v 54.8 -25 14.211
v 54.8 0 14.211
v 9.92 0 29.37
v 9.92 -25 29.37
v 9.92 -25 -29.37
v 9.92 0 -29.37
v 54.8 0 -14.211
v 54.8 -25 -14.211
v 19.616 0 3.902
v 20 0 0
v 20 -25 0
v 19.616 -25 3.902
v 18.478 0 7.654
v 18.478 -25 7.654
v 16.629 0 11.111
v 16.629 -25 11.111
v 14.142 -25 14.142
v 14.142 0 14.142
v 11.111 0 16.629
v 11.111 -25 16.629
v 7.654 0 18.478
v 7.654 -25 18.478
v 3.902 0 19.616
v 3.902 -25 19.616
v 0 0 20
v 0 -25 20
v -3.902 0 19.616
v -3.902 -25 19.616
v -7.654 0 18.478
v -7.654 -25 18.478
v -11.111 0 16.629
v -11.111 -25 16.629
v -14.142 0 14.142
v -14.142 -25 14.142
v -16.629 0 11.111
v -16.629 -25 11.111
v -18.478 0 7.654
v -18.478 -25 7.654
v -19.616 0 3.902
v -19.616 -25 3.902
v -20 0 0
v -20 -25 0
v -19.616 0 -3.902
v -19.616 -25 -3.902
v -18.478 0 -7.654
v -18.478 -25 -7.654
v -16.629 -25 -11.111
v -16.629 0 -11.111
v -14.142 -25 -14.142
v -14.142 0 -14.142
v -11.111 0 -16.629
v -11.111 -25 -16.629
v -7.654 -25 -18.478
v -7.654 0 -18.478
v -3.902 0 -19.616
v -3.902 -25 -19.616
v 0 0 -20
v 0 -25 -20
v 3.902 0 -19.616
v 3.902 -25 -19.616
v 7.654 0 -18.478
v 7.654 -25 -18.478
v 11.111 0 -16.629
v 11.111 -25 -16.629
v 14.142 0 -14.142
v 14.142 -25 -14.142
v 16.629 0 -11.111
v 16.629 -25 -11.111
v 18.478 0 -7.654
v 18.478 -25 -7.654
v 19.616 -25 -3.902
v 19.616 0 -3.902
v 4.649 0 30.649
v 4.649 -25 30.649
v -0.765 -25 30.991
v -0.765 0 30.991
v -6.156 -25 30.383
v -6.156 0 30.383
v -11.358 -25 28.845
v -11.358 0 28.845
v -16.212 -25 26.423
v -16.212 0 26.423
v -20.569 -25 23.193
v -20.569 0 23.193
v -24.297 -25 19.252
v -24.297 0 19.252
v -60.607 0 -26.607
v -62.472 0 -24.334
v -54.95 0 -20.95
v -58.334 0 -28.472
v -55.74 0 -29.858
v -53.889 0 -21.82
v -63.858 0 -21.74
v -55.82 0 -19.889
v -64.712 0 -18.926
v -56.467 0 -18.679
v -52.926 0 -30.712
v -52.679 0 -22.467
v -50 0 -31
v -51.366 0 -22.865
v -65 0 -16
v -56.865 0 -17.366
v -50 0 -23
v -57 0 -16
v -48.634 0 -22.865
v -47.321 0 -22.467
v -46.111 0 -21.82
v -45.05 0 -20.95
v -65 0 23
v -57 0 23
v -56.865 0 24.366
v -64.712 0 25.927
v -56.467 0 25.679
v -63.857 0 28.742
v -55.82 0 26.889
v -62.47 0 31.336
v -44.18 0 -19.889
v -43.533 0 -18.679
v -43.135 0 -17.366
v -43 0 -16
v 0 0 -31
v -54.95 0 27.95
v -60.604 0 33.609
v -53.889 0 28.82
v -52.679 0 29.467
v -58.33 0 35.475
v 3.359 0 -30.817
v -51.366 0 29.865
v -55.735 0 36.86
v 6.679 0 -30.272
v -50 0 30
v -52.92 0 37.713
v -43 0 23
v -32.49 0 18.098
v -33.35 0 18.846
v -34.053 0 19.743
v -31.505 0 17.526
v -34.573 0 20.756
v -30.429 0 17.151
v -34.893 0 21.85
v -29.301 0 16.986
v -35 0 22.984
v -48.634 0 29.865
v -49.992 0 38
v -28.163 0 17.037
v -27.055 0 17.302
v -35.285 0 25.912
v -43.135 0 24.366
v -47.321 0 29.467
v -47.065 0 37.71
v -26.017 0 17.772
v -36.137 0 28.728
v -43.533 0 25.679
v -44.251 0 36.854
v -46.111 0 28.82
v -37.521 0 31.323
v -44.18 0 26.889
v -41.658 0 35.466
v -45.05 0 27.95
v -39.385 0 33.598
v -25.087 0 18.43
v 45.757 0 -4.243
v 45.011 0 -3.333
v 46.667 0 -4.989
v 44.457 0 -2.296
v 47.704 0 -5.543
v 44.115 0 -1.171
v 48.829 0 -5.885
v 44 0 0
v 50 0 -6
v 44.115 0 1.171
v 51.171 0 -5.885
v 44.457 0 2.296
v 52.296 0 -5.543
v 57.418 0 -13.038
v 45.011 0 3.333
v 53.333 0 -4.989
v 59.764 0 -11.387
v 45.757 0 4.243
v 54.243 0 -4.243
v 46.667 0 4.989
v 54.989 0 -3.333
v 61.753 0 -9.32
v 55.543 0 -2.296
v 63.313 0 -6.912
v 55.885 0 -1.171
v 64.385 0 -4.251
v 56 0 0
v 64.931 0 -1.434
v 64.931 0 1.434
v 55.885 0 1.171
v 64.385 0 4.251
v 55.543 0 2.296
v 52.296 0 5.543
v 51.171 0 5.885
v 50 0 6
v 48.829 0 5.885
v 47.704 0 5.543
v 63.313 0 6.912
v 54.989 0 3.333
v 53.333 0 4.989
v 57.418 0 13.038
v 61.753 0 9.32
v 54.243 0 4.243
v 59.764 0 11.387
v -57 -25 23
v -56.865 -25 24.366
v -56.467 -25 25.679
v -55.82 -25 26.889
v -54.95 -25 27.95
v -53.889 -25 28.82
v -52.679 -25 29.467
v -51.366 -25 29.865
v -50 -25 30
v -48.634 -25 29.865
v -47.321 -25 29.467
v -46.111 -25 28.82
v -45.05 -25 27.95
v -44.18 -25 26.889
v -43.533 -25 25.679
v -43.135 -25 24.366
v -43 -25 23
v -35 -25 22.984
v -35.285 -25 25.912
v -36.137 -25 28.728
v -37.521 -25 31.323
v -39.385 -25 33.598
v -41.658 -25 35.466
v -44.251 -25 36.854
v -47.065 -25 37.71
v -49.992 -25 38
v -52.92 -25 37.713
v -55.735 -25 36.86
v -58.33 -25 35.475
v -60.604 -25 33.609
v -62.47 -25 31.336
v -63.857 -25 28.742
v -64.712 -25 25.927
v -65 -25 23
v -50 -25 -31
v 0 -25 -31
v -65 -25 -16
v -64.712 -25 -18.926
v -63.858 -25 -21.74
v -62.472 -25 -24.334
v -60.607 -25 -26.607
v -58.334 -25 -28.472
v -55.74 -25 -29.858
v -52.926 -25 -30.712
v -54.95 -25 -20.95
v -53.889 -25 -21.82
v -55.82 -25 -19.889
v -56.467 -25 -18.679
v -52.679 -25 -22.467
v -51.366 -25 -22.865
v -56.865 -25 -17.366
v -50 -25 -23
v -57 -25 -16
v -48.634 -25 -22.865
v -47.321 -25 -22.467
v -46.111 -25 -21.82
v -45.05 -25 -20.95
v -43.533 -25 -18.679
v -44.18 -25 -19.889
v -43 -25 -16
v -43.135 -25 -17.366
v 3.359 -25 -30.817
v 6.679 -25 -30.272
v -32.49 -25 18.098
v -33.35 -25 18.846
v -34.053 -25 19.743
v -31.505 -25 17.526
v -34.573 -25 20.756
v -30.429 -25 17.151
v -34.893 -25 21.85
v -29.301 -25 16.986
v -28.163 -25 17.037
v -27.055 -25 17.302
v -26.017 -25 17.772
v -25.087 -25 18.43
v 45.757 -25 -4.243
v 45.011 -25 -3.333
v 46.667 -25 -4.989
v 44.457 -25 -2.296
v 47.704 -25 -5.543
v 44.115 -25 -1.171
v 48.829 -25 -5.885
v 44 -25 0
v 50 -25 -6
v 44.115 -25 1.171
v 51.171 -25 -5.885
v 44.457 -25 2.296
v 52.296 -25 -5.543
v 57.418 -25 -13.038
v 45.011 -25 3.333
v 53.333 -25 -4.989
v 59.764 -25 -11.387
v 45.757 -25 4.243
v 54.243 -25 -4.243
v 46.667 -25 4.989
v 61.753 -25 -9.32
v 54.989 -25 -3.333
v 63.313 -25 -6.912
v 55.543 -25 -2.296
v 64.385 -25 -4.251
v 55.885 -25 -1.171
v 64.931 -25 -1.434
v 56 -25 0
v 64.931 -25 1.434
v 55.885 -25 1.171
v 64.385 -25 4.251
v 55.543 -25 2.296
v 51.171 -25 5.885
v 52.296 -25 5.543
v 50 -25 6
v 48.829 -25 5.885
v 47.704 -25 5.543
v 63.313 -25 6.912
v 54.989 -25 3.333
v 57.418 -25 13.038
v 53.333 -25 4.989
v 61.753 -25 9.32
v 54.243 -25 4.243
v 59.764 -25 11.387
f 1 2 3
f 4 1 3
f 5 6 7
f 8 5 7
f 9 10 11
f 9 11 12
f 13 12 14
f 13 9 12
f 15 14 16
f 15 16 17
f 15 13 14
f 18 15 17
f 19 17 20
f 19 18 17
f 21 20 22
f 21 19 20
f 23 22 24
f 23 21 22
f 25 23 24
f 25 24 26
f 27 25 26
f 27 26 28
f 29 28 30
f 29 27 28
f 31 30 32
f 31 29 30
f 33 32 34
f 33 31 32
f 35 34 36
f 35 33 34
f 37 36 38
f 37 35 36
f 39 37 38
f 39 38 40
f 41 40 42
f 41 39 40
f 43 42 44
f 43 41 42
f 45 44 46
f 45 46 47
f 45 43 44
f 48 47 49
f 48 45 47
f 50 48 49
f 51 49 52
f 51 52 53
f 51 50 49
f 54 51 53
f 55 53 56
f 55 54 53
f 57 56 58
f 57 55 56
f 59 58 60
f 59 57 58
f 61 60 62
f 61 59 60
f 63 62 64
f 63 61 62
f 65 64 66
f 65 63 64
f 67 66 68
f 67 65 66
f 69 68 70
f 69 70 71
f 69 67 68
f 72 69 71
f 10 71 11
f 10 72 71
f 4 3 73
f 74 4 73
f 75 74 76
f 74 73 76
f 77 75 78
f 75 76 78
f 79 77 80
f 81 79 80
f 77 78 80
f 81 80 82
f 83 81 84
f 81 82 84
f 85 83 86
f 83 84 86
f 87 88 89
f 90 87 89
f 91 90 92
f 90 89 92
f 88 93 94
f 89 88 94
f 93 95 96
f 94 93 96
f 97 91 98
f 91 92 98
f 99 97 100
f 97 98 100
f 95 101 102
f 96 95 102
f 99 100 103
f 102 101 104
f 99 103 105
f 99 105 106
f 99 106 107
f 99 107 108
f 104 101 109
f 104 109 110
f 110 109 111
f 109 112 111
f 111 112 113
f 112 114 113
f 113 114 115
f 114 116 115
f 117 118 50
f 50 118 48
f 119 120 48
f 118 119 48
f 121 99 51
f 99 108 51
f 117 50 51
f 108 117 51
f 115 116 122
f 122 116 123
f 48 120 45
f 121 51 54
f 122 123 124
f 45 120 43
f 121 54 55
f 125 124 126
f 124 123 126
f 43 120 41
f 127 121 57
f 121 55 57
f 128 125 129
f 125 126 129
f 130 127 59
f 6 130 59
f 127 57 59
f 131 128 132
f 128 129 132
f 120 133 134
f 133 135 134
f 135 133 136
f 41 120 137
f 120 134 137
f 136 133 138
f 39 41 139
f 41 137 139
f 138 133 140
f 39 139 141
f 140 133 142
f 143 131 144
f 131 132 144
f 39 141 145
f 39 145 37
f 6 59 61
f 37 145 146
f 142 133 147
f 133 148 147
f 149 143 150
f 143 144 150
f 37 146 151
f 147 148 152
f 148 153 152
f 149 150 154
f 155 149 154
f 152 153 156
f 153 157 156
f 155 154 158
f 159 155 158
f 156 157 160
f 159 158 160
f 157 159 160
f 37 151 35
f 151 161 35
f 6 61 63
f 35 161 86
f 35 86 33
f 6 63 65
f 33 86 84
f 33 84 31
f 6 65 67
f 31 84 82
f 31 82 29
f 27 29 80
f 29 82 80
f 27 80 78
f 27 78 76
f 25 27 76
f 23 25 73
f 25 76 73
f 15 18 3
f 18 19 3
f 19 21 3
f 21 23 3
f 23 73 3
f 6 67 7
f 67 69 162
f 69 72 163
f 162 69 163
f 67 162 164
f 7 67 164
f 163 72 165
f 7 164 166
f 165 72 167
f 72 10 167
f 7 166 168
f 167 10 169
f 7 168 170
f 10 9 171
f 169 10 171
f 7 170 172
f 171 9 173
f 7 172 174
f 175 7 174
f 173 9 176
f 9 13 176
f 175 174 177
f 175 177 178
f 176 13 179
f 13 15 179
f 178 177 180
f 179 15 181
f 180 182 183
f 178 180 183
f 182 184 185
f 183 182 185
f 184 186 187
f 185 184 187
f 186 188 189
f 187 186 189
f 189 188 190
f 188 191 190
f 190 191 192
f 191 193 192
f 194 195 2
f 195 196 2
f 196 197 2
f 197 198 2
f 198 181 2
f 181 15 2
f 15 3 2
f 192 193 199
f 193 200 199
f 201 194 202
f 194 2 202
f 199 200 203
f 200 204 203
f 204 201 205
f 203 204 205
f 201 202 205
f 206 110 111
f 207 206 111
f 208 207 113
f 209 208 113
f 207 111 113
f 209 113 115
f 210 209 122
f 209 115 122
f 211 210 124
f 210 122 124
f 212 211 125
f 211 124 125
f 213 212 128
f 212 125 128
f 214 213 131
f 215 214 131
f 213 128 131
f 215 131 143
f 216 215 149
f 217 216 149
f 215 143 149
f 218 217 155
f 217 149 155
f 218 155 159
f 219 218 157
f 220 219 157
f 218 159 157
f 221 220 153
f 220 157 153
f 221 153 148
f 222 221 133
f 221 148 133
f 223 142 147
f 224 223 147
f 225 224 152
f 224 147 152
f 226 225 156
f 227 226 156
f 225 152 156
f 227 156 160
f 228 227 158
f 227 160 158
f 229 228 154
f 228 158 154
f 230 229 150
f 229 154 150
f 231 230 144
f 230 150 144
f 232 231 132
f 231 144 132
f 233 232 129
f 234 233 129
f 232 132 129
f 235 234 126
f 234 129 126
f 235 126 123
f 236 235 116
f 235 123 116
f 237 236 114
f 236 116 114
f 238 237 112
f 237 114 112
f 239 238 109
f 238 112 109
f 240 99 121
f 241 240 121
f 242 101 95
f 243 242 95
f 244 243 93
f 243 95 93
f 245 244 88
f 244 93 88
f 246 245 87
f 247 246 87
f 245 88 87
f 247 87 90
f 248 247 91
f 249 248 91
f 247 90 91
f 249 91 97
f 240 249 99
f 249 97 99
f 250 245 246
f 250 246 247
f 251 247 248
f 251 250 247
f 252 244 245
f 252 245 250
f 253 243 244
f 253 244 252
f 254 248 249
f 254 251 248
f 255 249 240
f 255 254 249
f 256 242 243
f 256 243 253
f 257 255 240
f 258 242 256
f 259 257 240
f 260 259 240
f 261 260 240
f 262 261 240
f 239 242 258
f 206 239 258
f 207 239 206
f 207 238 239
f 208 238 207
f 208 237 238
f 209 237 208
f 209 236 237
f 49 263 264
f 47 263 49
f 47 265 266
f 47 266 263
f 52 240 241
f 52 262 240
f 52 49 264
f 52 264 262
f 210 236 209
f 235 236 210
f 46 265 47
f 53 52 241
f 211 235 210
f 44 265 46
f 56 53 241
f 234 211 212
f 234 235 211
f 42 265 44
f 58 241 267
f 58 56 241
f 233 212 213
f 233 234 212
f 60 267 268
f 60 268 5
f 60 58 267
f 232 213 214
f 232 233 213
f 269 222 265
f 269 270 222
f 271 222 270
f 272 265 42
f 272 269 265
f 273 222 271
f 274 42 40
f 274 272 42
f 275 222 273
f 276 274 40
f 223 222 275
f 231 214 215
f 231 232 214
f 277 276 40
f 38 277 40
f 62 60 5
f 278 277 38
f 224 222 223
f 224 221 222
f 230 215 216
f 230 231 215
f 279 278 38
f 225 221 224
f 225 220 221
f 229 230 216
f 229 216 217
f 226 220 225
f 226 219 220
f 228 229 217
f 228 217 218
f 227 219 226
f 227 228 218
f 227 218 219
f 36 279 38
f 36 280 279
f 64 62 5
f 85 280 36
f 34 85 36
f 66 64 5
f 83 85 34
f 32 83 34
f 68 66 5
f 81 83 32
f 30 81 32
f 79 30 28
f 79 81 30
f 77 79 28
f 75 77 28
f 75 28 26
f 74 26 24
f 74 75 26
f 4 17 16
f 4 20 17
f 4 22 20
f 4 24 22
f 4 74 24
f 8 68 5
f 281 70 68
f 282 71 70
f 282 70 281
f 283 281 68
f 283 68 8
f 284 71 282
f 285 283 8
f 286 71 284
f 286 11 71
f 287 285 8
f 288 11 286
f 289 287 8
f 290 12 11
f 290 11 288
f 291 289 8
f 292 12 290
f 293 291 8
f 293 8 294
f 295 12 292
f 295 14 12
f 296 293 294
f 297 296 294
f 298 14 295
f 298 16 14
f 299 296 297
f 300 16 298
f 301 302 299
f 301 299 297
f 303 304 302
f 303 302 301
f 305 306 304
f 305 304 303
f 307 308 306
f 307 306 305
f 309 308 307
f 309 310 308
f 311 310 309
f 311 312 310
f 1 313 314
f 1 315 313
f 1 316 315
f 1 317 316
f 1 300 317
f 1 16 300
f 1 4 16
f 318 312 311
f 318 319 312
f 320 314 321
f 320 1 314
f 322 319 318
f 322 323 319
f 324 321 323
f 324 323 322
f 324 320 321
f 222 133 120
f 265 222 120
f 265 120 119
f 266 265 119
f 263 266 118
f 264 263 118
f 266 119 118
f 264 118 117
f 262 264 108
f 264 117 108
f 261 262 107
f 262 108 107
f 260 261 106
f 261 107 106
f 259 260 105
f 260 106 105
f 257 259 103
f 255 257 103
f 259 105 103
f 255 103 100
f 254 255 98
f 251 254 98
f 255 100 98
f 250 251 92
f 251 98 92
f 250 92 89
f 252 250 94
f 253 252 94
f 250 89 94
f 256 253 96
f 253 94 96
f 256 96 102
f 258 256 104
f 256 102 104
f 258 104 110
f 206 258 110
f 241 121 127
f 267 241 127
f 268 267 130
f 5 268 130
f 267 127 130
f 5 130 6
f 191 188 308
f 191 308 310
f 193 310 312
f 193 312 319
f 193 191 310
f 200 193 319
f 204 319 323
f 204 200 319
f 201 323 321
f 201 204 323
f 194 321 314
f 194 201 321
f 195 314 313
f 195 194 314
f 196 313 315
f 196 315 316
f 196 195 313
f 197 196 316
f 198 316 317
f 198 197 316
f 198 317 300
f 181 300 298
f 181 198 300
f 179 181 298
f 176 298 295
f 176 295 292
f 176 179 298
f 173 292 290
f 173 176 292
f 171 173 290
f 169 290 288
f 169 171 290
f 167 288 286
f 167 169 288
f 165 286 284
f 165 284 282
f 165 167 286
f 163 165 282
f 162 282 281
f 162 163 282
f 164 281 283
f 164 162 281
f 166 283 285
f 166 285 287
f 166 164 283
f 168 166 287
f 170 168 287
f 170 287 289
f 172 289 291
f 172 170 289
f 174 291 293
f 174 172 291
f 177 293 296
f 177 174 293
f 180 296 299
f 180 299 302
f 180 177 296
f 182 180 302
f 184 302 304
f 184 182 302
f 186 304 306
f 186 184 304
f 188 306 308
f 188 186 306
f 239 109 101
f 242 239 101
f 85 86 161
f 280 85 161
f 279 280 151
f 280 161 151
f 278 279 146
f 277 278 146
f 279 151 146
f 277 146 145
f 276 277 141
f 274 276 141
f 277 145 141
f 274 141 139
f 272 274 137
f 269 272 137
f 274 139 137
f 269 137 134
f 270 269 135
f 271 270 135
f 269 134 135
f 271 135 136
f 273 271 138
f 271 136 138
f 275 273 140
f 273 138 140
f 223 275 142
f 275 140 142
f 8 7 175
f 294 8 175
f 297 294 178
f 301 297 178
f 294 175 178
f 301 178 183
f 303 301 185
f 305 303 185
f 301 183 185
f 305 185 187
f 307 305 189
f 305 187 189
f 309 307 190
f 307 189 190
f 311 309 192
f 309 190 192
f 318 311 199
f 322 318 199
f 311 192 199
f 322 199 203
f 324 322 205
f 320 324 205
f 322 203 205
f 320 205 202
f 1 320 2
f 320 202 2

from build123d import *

# Parameters (mm, degrees)
F0_R     = 20
F0_R_2   = 6
F1_DEPTH = 25


with BuildPart() as f1:
    # F0 (on Front) → F1 (new body)
    with BuildSketch(Plane.XZ):
        with BuildLine():
            Line((-50, -31), (0, -31))
            ThreePointArc((0, -31), (5.026517, -30.589772), (9.92, -29.369944))
            Line((9.92, -29.369944), (54.8, -14.211263))
            ThreePointArc((54.8, -14.211263), (65, 0), (54.8, 14.211263))
            Line((54.8, 14.211263), (9.92, 29.369944))
            ThreePointArc((9.92, 29.369944), (-8.790322, 29.727601), (-24.297307, 19.252036))
            ThreePointArc((-24.297307, 19.252036), (-30.975734, 17.312857), (-35.000008, 22.984455))
            ThreePointArc((-35.000008, 22.984455), (-49.992227, 37.999998), (-65, 23))
            Line((-65, 23), (-65, -16))
            ThreePointArc((-65, -16), (-60.606602, -26.606602), (-50, -31))
        make_face()
        Circle(F0_R, mode=Mode.SUBTRACT)
        with Locations((50, 0)):
            Circle(F0_R_2, mode=Mode.SUBTRACT)
        with BuildLine():
            ThreePointArc((-57, 23), (-50, 30), (-43, 23))
            Line((-43, 23), (-43, -16))
            ThreePointArc((-43, -16), (-50, -23), (-57, -16))
            Line((-57, -16), (-57, 23))
        make_face(mode=Mode.SUBTRACT)
    extrude(amount=F1_DEPTH)


solid = f1.part
